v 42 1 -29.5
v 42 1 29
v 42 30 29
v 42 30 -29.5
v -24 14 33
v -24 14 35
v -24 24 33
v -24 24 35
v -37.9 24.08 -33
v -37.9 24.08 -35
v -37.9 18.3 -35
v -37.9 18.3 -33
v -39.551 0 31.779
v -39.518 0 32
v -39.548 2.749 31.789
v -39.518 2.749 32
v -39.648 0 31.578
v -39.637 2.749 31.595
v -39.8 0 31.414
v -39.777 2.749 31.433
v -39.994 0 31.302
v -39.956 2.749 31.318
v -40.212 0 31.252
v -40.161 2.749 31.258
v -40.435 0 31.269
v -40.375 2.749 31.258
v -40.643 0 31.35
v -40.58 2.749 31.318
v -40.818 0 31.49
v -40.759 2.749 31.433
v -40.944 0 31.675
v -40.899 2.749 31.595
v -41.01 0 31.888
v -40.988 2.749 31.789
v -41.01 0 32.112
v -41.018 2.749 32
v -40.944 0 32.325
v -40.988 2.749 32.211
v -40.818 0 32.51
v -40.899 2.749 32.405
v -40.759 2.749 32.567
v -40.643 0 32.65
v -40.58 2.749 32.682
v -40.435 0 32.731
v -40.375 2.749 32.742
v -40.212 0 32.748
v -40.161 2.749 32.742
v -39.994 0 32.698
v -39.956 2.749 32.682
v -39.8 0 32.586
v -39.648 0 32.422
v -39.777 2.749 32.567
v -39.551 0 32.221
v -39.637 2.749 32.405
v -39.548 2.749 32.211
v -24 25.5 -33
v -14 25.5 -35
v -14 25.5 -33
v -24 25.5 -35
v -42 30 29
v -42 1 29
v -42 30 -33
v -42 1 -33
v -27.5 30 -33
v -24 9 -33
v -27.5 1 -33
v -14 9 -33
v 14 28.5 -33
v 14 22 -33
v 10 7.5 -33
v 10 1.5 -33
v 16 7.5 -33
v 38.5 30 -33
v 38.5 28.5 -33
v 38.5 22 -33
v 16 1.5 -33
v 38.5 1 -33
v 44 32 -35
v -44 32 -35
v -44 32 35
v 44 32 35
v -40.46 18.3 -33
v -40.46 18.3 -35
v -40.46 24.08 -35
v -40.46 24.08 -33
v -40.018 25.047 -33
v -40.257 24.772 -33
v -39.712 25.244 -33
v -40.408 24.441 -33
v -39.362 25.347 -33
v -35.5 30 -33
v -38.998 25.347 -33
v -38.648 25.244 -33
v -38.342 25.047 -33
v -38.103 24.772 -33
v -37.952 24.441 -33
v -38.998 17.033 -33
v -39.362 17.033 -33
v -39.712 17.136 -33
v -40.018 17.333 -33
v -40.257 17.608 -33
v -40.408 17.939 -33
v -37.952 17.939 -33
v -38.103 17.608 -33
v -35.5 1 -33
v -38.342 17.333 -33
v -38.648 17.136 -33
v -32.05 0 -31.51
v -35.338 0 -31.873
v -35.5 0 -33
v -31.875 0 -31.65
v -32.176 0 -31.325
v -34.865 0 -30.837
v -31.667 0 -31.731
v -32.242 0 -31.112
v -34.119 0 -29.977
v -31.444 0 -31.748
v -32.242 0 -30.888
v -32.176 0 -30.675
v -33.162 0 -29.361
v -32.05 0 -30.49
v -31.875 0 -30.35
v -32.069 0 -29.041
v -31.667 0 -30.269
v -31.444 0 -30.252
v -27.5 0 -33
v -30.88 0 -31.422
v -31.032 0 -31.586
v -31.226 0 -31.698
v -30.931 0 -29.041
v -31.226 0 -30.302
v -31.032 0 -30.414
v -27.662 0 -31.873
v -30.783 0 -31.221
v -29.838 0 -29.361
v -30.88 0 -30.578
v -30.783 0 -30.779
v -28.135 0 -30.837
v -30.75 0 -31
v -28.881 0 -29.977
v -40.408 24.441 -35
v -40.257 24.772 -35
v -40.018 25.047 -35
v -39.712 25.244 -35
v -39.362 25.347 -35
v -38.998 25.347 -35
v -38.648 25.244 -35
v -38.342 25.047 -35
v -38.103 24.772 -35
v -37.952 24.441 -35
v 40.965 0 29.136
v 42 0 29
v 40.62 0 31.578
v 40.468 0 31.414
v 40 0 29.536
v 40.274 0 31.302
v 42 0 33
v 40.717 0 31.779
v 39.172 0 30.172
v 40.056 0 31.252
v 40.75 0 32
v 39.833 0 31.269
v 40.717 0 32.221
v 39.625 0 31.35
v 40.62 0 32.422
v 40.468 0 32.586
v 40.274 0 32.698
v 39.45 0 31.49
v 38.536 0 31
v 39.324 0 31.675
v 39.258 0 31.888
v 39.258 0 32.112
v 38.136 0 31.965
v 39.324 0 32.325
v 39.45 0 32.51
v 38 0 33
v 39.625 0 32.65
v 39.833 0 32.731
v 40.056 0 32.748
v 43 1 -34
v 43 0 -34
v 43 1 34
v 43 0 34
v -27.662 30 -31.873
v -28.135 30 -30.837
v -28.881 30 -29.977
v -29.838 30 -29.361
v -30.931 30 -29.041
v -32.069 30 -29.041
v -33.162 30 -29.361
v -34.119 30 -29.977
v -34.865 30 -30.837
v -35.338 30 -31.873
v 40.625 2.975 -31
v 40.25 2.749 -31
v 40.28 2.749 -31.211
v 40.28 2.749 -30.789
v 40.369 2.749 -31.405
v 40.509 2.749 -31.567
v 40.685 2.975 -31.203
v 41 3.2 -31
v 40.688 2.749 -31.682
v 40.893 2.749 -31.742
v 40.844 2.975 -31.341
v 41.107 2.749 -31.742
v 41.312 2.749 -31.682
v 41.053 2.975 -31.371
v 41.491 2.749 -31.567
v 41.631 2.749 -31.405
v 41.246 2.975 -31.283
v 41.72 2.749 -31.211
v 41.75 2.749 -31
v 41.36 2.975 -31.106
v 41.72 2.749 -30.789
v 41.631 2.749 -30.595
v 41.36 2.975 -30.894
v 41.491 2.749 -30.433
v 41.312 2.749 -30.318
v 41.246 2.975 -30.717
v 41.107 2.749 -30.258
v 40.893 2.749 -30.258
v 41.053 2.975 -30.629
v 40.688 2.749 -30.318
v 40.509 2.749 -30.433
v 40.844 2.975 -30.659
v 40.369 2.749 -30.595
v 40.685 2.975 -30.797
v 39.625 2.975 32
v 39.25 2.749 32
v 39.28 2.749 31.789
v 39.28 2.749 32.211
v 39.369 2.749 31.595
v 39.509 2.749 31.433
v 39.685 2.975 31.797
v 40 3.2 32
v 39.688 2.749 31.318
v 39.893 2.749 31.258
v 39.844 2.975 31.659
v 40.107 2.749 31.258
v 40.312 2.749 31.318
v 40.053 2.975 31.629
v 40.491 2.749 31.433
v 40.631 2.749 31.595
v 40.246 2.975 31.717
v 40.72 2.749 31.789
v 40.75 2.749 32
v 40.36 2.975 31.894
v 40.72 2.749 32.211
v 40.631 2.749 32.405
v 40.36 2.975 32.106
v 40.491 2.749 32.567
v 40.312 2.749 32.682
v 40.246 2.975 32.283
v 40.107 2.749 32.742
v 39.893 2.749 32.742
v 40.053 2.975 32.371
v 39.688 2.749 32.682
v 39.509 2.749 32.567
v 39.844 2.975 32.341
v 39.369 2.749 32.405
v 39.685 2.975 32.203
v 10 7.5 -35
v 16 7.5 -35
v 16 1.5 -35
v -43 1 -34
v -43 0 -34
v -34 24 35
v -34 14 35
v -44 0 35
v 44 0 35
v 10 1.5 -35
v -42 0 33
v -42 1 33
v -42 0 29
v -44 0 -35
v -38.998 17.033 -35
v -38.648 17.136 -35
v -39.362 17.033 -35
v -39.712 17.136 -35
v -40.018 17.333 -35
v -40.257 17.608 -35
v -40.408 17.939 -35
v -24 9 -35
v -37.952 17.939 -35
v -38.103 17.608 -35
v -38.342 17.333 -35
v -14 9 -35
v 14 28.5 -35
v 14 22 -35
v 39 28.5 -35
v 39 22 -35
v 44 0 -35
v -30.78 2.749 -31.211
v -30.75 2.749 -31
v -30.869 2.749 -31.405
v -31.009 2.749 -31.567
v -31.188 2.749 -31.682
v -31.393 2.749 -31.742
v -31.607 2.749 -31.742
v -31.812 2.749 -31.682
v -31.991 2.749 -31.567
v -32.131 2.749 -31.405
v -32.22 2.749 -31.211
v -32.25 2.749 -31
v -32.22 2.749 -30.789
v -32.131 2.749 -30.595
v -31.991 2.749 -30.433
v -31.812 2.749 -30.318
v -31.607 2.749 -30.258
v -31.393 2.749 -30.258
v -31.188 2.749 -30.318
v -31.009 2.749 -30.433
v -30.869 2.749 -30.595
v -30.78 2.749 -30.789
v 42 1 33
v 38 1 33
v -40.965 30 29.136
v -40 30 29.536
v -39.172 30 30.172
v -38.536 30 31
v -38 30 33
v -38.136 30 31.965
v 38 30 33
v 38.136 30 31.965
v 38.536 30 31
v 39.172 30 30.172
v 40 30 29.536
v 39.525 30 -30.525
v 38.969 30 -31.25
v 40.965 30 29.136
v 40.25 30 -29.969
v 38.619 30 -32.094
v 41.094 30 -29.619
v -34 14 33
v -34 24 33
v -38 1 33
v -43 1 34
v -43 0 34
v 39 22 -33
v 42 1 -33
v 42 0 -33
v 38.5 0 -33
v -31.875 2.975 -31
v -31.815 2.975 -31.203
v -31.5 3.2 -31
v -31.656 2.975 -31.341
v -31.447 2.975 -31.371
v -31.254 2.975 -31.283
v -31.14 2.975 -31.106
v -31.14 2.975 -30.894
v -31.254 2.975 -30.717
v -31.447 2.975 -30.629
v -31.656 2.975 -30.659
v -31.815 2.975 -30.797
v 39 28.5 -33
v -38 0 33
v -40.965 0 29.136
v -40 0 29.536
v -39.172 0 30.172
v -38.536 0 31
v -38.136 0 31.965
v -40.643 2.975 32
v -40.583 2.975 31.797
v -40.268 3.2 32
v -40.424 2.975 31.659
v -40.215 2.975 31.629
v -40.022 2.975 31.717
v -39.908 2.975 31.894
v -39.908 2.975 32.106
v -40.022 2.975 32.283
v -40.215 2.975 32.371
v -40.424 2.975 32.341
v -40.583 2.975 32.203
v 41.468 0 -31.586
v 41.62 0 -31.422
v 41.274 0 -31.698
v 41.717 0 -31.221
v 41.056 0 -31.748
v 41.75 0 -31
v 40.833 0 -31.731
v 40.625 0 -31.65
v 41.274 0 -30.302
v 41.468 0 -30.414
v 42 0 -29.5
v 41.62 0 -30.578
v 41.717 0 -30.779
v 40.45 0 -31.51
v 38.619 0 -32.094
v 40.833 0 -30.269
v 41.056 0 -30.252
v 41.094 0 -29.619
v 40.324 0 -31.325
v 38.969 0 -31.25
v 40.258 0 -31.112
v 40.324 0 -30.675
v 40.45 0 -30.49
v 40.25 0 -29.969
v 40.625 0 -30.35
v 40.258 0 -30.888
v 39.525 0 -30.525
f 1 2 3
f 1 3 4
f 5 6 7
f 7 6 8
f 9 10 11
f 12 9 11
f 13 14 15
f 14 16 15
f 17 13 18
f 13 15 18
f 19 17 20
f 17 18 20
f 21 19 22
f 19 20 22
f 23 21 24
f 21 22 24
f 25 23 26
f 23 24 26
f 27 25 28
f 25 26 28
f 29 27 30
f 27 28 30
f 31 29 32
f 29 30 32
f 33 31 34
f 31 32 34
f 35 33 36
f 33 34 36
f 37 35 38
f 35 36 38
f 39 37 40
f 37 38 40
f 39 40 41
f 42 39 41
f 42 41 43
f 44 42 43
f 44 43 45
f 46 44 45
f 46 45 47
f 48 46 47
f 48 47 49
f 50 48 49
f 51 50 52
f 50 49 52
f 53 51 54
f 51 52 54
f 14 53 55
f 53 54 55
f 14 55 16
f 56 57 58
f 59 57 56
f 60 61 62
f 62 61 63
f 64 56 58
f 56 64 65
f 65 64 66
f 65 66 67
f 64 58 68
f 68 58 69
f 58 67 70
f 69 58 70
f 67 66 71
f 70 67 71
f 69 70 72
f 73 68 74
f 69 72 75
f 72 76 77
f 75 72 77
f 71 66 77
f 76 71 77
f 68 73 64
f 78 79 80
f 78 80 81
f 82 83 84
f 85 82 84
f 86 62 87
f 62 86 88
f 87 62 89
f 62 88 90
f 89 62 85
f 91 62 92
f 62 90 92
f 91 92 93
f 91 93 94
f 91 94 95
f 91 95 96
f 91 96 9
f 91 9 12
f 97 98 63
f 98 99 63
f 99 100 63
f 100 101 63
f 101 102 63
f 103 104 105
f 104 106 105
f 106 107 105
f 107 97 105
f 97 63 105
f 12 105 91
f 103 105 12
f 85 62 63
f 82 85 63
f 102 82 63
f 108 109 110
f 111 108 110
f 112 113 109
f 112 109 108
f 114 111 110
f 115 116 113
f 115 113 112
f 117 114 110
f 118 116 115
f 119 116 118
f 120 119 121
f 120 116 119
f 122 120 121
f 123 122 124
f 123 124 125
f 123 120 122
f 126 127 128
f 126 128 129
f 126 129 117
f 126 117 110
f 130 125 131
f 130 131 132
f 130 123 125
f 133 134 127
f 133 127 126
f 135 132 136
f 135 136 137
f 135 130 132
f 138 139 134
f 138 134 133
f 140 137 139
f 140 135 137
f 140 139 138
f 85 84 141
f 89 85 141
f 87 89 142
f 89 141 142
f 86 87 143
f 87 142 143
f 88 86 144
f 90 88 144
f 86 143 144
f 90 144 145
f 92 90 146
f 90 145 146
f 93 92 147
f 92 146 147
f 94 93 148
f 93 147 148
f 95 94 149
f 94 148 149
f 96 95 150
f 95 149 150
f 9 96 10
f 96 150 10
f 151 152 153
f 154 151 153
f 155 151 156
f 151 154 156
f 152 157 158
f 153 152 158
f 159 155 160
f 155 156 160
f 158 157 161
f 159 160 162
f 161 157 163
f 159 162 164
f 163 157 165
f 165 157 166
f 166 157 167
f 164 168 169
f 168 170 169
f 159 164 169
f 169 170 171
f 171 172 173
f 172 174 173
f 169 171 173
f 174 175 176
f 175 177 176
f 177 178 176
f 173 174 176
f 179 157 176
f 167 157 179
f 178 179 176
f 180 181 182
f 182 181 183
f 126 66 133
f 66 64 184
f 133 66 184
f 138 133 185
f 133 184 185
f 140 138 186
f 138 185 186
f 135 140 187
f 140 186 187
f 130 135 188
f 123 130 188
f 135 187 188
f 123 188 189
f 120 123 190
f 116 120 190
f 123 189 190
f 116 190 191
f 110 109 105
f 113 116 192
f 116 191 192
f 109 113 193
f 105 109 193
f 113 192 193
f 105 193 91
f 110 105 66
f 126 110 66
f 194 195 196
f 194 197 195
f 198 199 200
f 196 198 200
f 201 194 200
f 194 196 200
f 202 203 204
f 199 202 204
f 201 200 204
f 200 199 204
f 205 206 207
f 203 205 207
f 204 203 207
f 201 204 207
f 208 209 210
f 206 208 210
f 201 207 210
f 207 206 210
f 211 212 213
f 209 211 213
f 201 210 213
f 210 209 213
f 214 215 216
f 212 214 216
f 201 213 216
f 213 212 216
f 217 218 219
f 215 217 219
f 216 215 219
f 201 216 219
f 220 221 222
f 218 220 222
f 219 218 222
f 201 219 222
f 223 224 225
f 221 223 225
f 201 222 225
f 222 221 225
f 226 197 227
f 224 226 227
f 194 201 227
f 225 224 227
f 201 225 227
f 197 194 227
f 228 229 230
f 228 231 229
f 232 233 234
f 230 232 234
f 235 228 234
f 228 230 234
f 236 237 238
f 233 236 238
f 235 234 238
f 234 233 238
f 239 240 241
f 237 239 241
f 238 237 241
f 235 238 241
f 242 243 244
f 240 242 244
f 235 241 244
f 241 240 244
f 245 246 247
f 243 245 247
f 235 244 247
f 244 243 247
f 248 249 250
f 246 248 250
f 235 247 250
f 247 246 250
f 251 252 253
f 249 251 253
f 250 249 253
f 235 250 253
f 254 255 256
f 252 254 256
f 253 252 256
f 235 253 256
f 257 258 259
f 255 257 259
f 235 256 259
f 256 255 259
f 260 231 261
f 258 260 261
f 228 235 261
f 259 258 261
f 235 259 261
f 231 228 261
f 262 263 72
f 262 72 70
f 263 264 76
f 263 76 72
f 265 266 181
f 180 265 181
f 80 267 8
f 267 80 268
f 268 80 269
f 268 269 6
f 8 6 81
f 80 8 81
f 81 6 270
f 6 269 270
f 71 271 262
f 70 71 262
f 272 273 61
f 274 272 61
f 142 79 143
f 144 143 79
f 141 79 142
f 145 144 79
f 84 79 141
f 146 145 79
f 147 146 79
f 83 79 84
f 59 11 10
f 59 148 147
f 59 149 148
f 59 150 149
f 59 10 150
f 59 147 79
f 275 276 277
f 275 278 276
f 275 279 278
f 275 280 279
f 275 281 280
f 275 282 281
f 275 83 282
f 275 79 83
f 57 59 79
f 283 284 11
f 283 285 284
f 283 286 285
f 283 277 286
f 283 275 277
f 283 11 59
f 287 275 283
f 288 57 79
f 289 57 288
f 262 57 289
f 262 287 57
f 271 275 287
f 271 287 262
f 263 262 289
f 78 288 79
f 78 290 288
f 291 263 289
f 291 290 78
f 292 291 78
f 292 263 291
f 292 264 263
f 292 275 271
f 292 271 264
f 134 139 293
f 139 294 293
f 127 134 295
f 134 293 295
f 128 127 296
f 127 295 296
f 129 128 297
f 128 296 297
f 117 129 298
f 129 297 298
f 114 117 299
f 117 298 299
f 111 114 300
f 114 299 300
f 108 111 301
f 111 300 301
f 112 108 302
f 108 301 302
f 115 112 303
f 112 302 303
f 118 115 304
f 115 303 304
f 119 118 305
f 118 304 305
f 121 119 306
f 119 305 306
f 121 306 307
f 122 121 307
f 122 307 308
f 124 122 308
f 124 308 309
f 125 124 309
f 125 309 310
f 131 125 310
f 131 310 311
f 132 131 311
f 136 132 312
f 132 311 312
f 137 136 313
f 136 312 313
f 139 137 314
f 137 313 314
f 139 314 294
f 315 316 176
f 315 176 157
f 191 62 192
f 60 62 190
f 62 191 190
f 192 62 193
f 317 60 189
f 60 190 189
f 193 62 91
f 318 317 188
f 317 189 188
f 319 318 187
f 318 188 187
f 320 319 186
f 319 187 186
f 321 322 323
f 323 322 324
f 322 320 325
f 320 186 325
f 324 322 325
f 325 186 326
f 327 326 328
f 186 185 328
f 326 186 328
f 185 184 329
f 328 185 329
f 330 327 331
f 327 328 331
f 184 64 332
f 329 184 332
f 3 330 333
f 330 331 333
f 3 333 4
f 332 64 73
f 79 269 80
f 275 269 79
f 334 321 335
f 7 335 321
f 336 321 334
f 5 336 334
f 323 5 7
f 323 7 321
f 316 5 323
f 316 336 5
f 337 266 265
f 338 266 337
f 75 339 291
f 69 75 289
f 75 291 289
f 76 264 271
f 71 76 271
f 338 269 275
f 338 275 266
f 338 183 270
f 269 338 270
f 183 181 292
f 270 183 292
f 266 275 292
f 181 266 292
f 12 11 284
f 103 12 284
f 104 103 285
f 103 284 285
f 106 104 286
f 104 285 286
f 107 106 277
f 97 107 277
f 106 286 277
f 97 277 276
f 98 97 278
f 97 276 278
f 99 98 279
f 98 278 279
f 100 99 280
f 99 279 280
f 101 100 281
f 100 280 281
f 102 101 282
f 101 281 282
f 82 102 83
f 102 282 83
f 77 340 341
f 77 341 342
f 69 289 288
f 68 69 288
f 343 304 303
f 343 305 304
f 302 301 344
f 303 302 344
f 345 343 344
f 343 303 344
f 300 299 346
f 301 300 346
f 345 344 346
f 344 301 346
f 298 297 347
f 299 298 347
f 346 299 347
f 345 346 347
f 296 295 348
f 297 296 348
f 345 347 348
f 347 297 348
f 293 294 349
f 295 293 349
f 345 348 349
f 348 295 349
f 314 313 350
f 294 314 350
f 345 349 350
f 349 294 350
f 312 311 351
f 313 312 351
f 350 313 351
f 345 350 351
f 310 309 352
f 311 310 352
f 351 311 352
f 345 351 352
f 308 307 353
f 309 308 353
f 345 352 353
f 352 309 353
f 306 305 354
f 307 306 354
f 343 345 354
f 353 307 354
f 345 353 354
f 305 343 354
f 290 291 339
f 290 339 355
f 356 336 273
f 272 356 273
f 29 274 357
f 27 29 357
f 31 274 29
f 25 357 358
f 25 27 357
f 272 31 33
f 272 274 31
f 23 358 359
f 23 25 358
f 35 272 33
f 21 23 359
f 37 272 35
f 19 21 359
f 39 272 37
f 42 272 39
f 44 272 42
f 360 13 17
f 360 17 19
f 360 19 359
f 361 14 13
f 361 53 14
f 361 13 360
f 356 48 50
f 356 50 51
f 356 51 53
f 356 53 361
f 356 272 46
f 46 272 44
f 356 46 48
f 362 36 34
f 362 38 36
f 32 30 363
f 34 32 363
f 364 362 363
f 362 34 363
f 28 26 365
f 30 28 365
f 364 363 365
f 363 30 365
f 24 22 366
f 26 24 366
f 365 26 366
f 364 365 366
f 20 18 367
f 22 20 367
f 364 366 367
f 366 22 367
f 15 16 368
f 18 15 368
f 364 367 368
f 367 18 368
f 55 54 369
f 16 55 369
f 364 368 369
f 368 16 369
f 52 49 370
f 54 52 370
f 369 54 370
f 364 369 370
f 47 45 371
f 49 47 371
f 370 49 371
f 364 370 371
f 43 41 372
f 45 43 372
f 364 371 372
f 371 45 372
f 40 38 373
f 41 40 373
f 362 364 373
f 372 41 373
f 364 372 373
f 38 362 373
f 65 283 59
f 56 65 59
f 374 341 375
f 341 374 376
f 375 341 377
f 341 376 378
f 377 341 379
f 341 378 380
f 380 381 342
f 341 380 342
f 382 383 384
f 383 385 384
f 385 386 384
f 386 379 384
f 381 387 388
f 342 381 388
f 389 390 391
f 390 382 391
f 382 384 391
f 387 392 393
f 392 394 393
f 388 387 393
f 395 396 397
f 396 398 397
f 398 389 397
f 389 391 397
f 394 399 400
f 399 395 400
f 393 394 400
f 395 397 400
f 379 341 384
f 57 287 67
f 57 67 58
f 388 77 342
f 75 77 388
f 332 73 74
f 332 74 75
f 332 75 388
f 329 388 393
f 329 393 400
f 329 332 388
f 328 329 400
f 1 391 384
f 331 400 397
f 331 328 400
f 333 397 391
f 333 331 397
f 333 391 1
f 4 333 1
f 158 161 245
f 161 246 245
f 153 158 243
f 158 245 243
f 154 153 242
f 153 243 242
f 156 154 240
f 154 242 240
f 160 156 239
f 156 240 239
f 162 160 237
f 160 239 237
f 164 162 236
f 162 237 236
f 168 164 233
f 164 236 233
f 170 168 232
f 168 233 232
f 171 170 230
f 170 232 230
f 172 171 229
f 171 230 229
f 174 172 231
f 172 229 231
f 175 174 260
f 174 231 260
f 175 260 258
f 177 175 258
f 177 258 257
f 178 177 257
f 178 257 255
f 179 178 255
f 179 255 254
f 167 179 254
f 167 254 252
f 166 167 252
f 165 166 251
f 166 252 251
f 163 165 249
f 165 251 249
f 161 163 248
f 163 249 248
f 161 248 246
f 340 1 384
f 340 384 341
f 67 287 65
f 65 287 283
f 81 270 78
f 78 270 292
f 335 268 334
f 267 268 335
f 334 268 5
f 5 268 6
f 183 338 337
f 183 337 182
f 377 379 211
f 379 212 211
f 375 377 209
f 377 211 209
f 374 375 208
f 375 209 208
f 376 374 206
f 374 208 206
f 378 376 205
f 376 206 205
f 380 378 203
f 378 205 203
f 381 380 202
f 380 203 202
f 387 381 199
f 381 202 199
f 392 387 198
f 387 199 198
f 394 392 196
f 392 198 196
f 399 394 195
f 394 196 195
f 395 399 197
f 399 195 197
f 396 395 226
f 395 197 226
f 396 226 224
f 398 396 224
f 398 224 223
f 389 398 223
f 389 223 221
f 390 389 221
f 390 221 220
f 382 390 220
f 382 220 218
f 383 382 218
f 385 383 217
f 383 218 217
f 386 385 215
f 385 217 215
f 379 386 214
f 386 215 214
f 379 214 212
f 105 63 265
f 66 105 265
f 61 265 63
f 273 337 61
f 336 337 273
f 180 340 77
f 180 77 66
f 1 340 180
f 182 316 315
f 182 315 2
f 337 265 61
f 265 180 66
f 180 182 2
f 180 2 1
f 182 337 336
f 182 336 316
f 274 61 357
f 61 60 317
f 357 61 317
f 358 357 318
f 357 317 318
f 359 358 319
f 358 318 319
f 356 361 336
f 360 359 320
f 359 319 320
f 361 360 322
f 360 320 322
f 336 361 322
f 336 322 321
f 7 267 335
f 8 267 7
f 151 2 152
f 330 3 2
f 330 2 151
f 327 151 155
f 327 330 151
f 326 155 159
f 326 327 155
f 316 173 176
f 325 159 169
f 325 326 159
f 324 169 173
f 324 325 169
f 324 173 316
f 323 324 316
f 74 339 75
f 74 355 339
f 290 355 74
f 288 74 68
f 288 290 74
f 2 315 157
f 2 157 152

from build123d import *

# Parameters (mm, degrees)
SKETCH1_W                 = 88
SKETCH1_H                 = 70
BOSS_EXTRUDE1_DEPTH       = 32
SKETCH2_W                 = 84
SKETCH2_H                 = 66
CUT_EXTRUDE1_DEPTH        = 30
SKETCH4_W                 = 10
SKETCH4_H                 = 16.5
CUT_EXTRUDE2_DEPTH        = 3
SKETCH6_W                 = 10
SKETCH6_H                 = 10
CUT_EXTRUDE3_DEPTH        = 3
SKETCH7_W                 = 86
SKETCH7_H                 = 68
CUT_EXTRUDE4_DEPTH        = 1
SKETCH10_W                = 25
SKETCH10_H                = 6.5
SKETCH10_W_2              = 6
SKETCH10_H_2              = 6
CUT_EXTRUDE5_DEPTH        = 3
BOSS_EXTRUDE2_DEPTH       = 30
F_2_0MM_DOWEL_HOLE1_D     = 1.5
F_2_0MM_DOWEL_HOLE1_DEPTH = 2.749354536
F_2_0MM_DOWEL_HOLE1_TIP   = 0.450645464
CUT_EXTRUDE6_DEPTH        = 3


with BuildPart() as part:
    # Sketch1 → Boss-Extrude1 (new body)
    with BuildSketch(Plane(origin=(0, 0, 0), x_dir=(1, 0, 0), z_dir=(0, 1, 0))):
        Rectangle(SKETCH1_W, SKETCH1_H)
    extrude(amount=BOSS_EXTRUDE1_DEPTH)

    # Sketch2 → Cut-Extrude1 (cut)
    with BuildSketch(Plane(origin=(0, 0, 0), x_dir=(1, 0, 0), z_dir=(0, 1, 0))):
        Rectangle(SKETCH2_W, SKETCH2_H)
    extrude(amount=CUT_EXTRUDE1_DEPTH, mode=Mode.SUBTRACT)

    # Sketch4 → Cut-Extrude2 (cut)
    with BuildSketch(Plane(origin=(0, 0, -35), x_dir=(-1, 0, 0), z_dir=(0, 0, -1))):
        with Locations((19, 17.25)):
            Rectangle(SKETCH4_W, SKETCH4_H)
    extrude(amount=-CUT_EXTRUDE2_DEPTH, mode=Mode.SUBTRACT)

    # Sketch6 → Cut-Extrude3 (cut)
    with BuildSketch(Plane.XY.offset(35)):
        with Locations((-29, 19)):
            Rectangle(SKETCH6_W, SKETCH6_H)
    extrude(amount=-CUT_EXTRUDE3_DEPTH, mode=Mode.SUBTRACT)

    # Sketch7 → Cut-Extrude4 (cut)
    with BuildSketch(Plane.XZ):
        Rectangle(SKETCH7_W, SKETCH7_H)
    extrude(amount=-CUT_EXTRUDE4_DEPTH, mode=Mode.SUBTRACT)

    # Sketch10 → Cut-Extrude5 (cut)
    with BuildSketch(Plane(origin=(0, 0, -35), x_dir=(-1, 0, 0), z_dir=(0, 0, -1))):
        with Locations((-26.5, 25.25)):
            Rectangle(SKETCH10_W, SKETCH10_H)
        with Locations((-13, 4.5)):
            Rectangle(SKETCH10_W_2, SKETCH10_H_2)
    extrude(amount=-CUT_EXTRUDE5_DEPTH, mode=Mode.SUBTRACT)

    # Sketch11 → Boss-Extrude2 (add)
    with BuildSketch(Plane.XZ.offset(-30)):
        with BuildLine():
            Line((38, 33), (42, 33))
            Line((42, 33), (42, 29))
            ThreePointArc((42, 29), (39.171572875, 30.171572875), (38, 33))
        make_face()
        with BuildLine():
            Line((-42, 33), (-42, 29))
            ThreePointArc((-42, 29), (-39.171572875, 30.171572875), (-38, 33))
            Line((-38, 33), (-42, 33))
        make_face()
        with BuildLine():
            Line((42, -29.5), (42, -33))
            Line((42, -33), (38.5, -33))
            ThreePointArc((38.5, -33), (39.525126266, -30.525126266), (42, -29.5))
        make_face()
        with BuildLine():
            Line((-35.5, -33), (-27.5, -33))
            ThreePointArc((-27.5, -33), (-31.5, -29), (-35.5, -33))
        make_face()
    extrude(amount=BOSS_EXTRUDE2_DEPTH)

    # Ø2.0mm Dowel Hole1
    with Locations(Plane(origin=(0, 0, 0), x_dir=(-1, 0, 0), z_dir=(0, -1, 0))):
        with Locations((-41, 31), (31.5, 31), (40.267949192, -32), (-40, -32)):
            Hole(F_2_0MM_DOWEL_HOLE1_D / 2, depth=F_2_0MM_DOWEL_HOLE1_DEPTH)
            with Locations((0, 0, -(F_2_0MM_DOWEL_HOLE1_DEPTH + F_2_0MM_DOWEL_HOLE1_TIP / 2))):  # 118° drill point
                Cone(0, F_2_0MM_DOWEL_HOLE1_D / 2, F_2_0MM_DOWEL_HOLE1_TIP, mode=Mode.SUBTRACT)

    # Sketch22 → Cut-Extrude6 (cut)
    with BuildSketch(Plane(origin=(0, 0, -35), x_dir=(-1, 0, 0), z_dir=(0, 0, -1))):
        with BuildLine():
            Line((37.9, 24.08), (37.9, 18.3))
            ThreePointArc((37.9, 18.3), (39.18, 17.02), (40.46, 18.3))
            Line((40.46, 18.3), (40.46, 24.08))
            ThreePointArc((40.46, 24.08), (39.18, 25.36), (37.9, 24.08))
        make_face()
    extrude(amount=-CUT_EXTRUDE6_DEPTH, mode=Mode.SUBTRACT)


solid = part.part
